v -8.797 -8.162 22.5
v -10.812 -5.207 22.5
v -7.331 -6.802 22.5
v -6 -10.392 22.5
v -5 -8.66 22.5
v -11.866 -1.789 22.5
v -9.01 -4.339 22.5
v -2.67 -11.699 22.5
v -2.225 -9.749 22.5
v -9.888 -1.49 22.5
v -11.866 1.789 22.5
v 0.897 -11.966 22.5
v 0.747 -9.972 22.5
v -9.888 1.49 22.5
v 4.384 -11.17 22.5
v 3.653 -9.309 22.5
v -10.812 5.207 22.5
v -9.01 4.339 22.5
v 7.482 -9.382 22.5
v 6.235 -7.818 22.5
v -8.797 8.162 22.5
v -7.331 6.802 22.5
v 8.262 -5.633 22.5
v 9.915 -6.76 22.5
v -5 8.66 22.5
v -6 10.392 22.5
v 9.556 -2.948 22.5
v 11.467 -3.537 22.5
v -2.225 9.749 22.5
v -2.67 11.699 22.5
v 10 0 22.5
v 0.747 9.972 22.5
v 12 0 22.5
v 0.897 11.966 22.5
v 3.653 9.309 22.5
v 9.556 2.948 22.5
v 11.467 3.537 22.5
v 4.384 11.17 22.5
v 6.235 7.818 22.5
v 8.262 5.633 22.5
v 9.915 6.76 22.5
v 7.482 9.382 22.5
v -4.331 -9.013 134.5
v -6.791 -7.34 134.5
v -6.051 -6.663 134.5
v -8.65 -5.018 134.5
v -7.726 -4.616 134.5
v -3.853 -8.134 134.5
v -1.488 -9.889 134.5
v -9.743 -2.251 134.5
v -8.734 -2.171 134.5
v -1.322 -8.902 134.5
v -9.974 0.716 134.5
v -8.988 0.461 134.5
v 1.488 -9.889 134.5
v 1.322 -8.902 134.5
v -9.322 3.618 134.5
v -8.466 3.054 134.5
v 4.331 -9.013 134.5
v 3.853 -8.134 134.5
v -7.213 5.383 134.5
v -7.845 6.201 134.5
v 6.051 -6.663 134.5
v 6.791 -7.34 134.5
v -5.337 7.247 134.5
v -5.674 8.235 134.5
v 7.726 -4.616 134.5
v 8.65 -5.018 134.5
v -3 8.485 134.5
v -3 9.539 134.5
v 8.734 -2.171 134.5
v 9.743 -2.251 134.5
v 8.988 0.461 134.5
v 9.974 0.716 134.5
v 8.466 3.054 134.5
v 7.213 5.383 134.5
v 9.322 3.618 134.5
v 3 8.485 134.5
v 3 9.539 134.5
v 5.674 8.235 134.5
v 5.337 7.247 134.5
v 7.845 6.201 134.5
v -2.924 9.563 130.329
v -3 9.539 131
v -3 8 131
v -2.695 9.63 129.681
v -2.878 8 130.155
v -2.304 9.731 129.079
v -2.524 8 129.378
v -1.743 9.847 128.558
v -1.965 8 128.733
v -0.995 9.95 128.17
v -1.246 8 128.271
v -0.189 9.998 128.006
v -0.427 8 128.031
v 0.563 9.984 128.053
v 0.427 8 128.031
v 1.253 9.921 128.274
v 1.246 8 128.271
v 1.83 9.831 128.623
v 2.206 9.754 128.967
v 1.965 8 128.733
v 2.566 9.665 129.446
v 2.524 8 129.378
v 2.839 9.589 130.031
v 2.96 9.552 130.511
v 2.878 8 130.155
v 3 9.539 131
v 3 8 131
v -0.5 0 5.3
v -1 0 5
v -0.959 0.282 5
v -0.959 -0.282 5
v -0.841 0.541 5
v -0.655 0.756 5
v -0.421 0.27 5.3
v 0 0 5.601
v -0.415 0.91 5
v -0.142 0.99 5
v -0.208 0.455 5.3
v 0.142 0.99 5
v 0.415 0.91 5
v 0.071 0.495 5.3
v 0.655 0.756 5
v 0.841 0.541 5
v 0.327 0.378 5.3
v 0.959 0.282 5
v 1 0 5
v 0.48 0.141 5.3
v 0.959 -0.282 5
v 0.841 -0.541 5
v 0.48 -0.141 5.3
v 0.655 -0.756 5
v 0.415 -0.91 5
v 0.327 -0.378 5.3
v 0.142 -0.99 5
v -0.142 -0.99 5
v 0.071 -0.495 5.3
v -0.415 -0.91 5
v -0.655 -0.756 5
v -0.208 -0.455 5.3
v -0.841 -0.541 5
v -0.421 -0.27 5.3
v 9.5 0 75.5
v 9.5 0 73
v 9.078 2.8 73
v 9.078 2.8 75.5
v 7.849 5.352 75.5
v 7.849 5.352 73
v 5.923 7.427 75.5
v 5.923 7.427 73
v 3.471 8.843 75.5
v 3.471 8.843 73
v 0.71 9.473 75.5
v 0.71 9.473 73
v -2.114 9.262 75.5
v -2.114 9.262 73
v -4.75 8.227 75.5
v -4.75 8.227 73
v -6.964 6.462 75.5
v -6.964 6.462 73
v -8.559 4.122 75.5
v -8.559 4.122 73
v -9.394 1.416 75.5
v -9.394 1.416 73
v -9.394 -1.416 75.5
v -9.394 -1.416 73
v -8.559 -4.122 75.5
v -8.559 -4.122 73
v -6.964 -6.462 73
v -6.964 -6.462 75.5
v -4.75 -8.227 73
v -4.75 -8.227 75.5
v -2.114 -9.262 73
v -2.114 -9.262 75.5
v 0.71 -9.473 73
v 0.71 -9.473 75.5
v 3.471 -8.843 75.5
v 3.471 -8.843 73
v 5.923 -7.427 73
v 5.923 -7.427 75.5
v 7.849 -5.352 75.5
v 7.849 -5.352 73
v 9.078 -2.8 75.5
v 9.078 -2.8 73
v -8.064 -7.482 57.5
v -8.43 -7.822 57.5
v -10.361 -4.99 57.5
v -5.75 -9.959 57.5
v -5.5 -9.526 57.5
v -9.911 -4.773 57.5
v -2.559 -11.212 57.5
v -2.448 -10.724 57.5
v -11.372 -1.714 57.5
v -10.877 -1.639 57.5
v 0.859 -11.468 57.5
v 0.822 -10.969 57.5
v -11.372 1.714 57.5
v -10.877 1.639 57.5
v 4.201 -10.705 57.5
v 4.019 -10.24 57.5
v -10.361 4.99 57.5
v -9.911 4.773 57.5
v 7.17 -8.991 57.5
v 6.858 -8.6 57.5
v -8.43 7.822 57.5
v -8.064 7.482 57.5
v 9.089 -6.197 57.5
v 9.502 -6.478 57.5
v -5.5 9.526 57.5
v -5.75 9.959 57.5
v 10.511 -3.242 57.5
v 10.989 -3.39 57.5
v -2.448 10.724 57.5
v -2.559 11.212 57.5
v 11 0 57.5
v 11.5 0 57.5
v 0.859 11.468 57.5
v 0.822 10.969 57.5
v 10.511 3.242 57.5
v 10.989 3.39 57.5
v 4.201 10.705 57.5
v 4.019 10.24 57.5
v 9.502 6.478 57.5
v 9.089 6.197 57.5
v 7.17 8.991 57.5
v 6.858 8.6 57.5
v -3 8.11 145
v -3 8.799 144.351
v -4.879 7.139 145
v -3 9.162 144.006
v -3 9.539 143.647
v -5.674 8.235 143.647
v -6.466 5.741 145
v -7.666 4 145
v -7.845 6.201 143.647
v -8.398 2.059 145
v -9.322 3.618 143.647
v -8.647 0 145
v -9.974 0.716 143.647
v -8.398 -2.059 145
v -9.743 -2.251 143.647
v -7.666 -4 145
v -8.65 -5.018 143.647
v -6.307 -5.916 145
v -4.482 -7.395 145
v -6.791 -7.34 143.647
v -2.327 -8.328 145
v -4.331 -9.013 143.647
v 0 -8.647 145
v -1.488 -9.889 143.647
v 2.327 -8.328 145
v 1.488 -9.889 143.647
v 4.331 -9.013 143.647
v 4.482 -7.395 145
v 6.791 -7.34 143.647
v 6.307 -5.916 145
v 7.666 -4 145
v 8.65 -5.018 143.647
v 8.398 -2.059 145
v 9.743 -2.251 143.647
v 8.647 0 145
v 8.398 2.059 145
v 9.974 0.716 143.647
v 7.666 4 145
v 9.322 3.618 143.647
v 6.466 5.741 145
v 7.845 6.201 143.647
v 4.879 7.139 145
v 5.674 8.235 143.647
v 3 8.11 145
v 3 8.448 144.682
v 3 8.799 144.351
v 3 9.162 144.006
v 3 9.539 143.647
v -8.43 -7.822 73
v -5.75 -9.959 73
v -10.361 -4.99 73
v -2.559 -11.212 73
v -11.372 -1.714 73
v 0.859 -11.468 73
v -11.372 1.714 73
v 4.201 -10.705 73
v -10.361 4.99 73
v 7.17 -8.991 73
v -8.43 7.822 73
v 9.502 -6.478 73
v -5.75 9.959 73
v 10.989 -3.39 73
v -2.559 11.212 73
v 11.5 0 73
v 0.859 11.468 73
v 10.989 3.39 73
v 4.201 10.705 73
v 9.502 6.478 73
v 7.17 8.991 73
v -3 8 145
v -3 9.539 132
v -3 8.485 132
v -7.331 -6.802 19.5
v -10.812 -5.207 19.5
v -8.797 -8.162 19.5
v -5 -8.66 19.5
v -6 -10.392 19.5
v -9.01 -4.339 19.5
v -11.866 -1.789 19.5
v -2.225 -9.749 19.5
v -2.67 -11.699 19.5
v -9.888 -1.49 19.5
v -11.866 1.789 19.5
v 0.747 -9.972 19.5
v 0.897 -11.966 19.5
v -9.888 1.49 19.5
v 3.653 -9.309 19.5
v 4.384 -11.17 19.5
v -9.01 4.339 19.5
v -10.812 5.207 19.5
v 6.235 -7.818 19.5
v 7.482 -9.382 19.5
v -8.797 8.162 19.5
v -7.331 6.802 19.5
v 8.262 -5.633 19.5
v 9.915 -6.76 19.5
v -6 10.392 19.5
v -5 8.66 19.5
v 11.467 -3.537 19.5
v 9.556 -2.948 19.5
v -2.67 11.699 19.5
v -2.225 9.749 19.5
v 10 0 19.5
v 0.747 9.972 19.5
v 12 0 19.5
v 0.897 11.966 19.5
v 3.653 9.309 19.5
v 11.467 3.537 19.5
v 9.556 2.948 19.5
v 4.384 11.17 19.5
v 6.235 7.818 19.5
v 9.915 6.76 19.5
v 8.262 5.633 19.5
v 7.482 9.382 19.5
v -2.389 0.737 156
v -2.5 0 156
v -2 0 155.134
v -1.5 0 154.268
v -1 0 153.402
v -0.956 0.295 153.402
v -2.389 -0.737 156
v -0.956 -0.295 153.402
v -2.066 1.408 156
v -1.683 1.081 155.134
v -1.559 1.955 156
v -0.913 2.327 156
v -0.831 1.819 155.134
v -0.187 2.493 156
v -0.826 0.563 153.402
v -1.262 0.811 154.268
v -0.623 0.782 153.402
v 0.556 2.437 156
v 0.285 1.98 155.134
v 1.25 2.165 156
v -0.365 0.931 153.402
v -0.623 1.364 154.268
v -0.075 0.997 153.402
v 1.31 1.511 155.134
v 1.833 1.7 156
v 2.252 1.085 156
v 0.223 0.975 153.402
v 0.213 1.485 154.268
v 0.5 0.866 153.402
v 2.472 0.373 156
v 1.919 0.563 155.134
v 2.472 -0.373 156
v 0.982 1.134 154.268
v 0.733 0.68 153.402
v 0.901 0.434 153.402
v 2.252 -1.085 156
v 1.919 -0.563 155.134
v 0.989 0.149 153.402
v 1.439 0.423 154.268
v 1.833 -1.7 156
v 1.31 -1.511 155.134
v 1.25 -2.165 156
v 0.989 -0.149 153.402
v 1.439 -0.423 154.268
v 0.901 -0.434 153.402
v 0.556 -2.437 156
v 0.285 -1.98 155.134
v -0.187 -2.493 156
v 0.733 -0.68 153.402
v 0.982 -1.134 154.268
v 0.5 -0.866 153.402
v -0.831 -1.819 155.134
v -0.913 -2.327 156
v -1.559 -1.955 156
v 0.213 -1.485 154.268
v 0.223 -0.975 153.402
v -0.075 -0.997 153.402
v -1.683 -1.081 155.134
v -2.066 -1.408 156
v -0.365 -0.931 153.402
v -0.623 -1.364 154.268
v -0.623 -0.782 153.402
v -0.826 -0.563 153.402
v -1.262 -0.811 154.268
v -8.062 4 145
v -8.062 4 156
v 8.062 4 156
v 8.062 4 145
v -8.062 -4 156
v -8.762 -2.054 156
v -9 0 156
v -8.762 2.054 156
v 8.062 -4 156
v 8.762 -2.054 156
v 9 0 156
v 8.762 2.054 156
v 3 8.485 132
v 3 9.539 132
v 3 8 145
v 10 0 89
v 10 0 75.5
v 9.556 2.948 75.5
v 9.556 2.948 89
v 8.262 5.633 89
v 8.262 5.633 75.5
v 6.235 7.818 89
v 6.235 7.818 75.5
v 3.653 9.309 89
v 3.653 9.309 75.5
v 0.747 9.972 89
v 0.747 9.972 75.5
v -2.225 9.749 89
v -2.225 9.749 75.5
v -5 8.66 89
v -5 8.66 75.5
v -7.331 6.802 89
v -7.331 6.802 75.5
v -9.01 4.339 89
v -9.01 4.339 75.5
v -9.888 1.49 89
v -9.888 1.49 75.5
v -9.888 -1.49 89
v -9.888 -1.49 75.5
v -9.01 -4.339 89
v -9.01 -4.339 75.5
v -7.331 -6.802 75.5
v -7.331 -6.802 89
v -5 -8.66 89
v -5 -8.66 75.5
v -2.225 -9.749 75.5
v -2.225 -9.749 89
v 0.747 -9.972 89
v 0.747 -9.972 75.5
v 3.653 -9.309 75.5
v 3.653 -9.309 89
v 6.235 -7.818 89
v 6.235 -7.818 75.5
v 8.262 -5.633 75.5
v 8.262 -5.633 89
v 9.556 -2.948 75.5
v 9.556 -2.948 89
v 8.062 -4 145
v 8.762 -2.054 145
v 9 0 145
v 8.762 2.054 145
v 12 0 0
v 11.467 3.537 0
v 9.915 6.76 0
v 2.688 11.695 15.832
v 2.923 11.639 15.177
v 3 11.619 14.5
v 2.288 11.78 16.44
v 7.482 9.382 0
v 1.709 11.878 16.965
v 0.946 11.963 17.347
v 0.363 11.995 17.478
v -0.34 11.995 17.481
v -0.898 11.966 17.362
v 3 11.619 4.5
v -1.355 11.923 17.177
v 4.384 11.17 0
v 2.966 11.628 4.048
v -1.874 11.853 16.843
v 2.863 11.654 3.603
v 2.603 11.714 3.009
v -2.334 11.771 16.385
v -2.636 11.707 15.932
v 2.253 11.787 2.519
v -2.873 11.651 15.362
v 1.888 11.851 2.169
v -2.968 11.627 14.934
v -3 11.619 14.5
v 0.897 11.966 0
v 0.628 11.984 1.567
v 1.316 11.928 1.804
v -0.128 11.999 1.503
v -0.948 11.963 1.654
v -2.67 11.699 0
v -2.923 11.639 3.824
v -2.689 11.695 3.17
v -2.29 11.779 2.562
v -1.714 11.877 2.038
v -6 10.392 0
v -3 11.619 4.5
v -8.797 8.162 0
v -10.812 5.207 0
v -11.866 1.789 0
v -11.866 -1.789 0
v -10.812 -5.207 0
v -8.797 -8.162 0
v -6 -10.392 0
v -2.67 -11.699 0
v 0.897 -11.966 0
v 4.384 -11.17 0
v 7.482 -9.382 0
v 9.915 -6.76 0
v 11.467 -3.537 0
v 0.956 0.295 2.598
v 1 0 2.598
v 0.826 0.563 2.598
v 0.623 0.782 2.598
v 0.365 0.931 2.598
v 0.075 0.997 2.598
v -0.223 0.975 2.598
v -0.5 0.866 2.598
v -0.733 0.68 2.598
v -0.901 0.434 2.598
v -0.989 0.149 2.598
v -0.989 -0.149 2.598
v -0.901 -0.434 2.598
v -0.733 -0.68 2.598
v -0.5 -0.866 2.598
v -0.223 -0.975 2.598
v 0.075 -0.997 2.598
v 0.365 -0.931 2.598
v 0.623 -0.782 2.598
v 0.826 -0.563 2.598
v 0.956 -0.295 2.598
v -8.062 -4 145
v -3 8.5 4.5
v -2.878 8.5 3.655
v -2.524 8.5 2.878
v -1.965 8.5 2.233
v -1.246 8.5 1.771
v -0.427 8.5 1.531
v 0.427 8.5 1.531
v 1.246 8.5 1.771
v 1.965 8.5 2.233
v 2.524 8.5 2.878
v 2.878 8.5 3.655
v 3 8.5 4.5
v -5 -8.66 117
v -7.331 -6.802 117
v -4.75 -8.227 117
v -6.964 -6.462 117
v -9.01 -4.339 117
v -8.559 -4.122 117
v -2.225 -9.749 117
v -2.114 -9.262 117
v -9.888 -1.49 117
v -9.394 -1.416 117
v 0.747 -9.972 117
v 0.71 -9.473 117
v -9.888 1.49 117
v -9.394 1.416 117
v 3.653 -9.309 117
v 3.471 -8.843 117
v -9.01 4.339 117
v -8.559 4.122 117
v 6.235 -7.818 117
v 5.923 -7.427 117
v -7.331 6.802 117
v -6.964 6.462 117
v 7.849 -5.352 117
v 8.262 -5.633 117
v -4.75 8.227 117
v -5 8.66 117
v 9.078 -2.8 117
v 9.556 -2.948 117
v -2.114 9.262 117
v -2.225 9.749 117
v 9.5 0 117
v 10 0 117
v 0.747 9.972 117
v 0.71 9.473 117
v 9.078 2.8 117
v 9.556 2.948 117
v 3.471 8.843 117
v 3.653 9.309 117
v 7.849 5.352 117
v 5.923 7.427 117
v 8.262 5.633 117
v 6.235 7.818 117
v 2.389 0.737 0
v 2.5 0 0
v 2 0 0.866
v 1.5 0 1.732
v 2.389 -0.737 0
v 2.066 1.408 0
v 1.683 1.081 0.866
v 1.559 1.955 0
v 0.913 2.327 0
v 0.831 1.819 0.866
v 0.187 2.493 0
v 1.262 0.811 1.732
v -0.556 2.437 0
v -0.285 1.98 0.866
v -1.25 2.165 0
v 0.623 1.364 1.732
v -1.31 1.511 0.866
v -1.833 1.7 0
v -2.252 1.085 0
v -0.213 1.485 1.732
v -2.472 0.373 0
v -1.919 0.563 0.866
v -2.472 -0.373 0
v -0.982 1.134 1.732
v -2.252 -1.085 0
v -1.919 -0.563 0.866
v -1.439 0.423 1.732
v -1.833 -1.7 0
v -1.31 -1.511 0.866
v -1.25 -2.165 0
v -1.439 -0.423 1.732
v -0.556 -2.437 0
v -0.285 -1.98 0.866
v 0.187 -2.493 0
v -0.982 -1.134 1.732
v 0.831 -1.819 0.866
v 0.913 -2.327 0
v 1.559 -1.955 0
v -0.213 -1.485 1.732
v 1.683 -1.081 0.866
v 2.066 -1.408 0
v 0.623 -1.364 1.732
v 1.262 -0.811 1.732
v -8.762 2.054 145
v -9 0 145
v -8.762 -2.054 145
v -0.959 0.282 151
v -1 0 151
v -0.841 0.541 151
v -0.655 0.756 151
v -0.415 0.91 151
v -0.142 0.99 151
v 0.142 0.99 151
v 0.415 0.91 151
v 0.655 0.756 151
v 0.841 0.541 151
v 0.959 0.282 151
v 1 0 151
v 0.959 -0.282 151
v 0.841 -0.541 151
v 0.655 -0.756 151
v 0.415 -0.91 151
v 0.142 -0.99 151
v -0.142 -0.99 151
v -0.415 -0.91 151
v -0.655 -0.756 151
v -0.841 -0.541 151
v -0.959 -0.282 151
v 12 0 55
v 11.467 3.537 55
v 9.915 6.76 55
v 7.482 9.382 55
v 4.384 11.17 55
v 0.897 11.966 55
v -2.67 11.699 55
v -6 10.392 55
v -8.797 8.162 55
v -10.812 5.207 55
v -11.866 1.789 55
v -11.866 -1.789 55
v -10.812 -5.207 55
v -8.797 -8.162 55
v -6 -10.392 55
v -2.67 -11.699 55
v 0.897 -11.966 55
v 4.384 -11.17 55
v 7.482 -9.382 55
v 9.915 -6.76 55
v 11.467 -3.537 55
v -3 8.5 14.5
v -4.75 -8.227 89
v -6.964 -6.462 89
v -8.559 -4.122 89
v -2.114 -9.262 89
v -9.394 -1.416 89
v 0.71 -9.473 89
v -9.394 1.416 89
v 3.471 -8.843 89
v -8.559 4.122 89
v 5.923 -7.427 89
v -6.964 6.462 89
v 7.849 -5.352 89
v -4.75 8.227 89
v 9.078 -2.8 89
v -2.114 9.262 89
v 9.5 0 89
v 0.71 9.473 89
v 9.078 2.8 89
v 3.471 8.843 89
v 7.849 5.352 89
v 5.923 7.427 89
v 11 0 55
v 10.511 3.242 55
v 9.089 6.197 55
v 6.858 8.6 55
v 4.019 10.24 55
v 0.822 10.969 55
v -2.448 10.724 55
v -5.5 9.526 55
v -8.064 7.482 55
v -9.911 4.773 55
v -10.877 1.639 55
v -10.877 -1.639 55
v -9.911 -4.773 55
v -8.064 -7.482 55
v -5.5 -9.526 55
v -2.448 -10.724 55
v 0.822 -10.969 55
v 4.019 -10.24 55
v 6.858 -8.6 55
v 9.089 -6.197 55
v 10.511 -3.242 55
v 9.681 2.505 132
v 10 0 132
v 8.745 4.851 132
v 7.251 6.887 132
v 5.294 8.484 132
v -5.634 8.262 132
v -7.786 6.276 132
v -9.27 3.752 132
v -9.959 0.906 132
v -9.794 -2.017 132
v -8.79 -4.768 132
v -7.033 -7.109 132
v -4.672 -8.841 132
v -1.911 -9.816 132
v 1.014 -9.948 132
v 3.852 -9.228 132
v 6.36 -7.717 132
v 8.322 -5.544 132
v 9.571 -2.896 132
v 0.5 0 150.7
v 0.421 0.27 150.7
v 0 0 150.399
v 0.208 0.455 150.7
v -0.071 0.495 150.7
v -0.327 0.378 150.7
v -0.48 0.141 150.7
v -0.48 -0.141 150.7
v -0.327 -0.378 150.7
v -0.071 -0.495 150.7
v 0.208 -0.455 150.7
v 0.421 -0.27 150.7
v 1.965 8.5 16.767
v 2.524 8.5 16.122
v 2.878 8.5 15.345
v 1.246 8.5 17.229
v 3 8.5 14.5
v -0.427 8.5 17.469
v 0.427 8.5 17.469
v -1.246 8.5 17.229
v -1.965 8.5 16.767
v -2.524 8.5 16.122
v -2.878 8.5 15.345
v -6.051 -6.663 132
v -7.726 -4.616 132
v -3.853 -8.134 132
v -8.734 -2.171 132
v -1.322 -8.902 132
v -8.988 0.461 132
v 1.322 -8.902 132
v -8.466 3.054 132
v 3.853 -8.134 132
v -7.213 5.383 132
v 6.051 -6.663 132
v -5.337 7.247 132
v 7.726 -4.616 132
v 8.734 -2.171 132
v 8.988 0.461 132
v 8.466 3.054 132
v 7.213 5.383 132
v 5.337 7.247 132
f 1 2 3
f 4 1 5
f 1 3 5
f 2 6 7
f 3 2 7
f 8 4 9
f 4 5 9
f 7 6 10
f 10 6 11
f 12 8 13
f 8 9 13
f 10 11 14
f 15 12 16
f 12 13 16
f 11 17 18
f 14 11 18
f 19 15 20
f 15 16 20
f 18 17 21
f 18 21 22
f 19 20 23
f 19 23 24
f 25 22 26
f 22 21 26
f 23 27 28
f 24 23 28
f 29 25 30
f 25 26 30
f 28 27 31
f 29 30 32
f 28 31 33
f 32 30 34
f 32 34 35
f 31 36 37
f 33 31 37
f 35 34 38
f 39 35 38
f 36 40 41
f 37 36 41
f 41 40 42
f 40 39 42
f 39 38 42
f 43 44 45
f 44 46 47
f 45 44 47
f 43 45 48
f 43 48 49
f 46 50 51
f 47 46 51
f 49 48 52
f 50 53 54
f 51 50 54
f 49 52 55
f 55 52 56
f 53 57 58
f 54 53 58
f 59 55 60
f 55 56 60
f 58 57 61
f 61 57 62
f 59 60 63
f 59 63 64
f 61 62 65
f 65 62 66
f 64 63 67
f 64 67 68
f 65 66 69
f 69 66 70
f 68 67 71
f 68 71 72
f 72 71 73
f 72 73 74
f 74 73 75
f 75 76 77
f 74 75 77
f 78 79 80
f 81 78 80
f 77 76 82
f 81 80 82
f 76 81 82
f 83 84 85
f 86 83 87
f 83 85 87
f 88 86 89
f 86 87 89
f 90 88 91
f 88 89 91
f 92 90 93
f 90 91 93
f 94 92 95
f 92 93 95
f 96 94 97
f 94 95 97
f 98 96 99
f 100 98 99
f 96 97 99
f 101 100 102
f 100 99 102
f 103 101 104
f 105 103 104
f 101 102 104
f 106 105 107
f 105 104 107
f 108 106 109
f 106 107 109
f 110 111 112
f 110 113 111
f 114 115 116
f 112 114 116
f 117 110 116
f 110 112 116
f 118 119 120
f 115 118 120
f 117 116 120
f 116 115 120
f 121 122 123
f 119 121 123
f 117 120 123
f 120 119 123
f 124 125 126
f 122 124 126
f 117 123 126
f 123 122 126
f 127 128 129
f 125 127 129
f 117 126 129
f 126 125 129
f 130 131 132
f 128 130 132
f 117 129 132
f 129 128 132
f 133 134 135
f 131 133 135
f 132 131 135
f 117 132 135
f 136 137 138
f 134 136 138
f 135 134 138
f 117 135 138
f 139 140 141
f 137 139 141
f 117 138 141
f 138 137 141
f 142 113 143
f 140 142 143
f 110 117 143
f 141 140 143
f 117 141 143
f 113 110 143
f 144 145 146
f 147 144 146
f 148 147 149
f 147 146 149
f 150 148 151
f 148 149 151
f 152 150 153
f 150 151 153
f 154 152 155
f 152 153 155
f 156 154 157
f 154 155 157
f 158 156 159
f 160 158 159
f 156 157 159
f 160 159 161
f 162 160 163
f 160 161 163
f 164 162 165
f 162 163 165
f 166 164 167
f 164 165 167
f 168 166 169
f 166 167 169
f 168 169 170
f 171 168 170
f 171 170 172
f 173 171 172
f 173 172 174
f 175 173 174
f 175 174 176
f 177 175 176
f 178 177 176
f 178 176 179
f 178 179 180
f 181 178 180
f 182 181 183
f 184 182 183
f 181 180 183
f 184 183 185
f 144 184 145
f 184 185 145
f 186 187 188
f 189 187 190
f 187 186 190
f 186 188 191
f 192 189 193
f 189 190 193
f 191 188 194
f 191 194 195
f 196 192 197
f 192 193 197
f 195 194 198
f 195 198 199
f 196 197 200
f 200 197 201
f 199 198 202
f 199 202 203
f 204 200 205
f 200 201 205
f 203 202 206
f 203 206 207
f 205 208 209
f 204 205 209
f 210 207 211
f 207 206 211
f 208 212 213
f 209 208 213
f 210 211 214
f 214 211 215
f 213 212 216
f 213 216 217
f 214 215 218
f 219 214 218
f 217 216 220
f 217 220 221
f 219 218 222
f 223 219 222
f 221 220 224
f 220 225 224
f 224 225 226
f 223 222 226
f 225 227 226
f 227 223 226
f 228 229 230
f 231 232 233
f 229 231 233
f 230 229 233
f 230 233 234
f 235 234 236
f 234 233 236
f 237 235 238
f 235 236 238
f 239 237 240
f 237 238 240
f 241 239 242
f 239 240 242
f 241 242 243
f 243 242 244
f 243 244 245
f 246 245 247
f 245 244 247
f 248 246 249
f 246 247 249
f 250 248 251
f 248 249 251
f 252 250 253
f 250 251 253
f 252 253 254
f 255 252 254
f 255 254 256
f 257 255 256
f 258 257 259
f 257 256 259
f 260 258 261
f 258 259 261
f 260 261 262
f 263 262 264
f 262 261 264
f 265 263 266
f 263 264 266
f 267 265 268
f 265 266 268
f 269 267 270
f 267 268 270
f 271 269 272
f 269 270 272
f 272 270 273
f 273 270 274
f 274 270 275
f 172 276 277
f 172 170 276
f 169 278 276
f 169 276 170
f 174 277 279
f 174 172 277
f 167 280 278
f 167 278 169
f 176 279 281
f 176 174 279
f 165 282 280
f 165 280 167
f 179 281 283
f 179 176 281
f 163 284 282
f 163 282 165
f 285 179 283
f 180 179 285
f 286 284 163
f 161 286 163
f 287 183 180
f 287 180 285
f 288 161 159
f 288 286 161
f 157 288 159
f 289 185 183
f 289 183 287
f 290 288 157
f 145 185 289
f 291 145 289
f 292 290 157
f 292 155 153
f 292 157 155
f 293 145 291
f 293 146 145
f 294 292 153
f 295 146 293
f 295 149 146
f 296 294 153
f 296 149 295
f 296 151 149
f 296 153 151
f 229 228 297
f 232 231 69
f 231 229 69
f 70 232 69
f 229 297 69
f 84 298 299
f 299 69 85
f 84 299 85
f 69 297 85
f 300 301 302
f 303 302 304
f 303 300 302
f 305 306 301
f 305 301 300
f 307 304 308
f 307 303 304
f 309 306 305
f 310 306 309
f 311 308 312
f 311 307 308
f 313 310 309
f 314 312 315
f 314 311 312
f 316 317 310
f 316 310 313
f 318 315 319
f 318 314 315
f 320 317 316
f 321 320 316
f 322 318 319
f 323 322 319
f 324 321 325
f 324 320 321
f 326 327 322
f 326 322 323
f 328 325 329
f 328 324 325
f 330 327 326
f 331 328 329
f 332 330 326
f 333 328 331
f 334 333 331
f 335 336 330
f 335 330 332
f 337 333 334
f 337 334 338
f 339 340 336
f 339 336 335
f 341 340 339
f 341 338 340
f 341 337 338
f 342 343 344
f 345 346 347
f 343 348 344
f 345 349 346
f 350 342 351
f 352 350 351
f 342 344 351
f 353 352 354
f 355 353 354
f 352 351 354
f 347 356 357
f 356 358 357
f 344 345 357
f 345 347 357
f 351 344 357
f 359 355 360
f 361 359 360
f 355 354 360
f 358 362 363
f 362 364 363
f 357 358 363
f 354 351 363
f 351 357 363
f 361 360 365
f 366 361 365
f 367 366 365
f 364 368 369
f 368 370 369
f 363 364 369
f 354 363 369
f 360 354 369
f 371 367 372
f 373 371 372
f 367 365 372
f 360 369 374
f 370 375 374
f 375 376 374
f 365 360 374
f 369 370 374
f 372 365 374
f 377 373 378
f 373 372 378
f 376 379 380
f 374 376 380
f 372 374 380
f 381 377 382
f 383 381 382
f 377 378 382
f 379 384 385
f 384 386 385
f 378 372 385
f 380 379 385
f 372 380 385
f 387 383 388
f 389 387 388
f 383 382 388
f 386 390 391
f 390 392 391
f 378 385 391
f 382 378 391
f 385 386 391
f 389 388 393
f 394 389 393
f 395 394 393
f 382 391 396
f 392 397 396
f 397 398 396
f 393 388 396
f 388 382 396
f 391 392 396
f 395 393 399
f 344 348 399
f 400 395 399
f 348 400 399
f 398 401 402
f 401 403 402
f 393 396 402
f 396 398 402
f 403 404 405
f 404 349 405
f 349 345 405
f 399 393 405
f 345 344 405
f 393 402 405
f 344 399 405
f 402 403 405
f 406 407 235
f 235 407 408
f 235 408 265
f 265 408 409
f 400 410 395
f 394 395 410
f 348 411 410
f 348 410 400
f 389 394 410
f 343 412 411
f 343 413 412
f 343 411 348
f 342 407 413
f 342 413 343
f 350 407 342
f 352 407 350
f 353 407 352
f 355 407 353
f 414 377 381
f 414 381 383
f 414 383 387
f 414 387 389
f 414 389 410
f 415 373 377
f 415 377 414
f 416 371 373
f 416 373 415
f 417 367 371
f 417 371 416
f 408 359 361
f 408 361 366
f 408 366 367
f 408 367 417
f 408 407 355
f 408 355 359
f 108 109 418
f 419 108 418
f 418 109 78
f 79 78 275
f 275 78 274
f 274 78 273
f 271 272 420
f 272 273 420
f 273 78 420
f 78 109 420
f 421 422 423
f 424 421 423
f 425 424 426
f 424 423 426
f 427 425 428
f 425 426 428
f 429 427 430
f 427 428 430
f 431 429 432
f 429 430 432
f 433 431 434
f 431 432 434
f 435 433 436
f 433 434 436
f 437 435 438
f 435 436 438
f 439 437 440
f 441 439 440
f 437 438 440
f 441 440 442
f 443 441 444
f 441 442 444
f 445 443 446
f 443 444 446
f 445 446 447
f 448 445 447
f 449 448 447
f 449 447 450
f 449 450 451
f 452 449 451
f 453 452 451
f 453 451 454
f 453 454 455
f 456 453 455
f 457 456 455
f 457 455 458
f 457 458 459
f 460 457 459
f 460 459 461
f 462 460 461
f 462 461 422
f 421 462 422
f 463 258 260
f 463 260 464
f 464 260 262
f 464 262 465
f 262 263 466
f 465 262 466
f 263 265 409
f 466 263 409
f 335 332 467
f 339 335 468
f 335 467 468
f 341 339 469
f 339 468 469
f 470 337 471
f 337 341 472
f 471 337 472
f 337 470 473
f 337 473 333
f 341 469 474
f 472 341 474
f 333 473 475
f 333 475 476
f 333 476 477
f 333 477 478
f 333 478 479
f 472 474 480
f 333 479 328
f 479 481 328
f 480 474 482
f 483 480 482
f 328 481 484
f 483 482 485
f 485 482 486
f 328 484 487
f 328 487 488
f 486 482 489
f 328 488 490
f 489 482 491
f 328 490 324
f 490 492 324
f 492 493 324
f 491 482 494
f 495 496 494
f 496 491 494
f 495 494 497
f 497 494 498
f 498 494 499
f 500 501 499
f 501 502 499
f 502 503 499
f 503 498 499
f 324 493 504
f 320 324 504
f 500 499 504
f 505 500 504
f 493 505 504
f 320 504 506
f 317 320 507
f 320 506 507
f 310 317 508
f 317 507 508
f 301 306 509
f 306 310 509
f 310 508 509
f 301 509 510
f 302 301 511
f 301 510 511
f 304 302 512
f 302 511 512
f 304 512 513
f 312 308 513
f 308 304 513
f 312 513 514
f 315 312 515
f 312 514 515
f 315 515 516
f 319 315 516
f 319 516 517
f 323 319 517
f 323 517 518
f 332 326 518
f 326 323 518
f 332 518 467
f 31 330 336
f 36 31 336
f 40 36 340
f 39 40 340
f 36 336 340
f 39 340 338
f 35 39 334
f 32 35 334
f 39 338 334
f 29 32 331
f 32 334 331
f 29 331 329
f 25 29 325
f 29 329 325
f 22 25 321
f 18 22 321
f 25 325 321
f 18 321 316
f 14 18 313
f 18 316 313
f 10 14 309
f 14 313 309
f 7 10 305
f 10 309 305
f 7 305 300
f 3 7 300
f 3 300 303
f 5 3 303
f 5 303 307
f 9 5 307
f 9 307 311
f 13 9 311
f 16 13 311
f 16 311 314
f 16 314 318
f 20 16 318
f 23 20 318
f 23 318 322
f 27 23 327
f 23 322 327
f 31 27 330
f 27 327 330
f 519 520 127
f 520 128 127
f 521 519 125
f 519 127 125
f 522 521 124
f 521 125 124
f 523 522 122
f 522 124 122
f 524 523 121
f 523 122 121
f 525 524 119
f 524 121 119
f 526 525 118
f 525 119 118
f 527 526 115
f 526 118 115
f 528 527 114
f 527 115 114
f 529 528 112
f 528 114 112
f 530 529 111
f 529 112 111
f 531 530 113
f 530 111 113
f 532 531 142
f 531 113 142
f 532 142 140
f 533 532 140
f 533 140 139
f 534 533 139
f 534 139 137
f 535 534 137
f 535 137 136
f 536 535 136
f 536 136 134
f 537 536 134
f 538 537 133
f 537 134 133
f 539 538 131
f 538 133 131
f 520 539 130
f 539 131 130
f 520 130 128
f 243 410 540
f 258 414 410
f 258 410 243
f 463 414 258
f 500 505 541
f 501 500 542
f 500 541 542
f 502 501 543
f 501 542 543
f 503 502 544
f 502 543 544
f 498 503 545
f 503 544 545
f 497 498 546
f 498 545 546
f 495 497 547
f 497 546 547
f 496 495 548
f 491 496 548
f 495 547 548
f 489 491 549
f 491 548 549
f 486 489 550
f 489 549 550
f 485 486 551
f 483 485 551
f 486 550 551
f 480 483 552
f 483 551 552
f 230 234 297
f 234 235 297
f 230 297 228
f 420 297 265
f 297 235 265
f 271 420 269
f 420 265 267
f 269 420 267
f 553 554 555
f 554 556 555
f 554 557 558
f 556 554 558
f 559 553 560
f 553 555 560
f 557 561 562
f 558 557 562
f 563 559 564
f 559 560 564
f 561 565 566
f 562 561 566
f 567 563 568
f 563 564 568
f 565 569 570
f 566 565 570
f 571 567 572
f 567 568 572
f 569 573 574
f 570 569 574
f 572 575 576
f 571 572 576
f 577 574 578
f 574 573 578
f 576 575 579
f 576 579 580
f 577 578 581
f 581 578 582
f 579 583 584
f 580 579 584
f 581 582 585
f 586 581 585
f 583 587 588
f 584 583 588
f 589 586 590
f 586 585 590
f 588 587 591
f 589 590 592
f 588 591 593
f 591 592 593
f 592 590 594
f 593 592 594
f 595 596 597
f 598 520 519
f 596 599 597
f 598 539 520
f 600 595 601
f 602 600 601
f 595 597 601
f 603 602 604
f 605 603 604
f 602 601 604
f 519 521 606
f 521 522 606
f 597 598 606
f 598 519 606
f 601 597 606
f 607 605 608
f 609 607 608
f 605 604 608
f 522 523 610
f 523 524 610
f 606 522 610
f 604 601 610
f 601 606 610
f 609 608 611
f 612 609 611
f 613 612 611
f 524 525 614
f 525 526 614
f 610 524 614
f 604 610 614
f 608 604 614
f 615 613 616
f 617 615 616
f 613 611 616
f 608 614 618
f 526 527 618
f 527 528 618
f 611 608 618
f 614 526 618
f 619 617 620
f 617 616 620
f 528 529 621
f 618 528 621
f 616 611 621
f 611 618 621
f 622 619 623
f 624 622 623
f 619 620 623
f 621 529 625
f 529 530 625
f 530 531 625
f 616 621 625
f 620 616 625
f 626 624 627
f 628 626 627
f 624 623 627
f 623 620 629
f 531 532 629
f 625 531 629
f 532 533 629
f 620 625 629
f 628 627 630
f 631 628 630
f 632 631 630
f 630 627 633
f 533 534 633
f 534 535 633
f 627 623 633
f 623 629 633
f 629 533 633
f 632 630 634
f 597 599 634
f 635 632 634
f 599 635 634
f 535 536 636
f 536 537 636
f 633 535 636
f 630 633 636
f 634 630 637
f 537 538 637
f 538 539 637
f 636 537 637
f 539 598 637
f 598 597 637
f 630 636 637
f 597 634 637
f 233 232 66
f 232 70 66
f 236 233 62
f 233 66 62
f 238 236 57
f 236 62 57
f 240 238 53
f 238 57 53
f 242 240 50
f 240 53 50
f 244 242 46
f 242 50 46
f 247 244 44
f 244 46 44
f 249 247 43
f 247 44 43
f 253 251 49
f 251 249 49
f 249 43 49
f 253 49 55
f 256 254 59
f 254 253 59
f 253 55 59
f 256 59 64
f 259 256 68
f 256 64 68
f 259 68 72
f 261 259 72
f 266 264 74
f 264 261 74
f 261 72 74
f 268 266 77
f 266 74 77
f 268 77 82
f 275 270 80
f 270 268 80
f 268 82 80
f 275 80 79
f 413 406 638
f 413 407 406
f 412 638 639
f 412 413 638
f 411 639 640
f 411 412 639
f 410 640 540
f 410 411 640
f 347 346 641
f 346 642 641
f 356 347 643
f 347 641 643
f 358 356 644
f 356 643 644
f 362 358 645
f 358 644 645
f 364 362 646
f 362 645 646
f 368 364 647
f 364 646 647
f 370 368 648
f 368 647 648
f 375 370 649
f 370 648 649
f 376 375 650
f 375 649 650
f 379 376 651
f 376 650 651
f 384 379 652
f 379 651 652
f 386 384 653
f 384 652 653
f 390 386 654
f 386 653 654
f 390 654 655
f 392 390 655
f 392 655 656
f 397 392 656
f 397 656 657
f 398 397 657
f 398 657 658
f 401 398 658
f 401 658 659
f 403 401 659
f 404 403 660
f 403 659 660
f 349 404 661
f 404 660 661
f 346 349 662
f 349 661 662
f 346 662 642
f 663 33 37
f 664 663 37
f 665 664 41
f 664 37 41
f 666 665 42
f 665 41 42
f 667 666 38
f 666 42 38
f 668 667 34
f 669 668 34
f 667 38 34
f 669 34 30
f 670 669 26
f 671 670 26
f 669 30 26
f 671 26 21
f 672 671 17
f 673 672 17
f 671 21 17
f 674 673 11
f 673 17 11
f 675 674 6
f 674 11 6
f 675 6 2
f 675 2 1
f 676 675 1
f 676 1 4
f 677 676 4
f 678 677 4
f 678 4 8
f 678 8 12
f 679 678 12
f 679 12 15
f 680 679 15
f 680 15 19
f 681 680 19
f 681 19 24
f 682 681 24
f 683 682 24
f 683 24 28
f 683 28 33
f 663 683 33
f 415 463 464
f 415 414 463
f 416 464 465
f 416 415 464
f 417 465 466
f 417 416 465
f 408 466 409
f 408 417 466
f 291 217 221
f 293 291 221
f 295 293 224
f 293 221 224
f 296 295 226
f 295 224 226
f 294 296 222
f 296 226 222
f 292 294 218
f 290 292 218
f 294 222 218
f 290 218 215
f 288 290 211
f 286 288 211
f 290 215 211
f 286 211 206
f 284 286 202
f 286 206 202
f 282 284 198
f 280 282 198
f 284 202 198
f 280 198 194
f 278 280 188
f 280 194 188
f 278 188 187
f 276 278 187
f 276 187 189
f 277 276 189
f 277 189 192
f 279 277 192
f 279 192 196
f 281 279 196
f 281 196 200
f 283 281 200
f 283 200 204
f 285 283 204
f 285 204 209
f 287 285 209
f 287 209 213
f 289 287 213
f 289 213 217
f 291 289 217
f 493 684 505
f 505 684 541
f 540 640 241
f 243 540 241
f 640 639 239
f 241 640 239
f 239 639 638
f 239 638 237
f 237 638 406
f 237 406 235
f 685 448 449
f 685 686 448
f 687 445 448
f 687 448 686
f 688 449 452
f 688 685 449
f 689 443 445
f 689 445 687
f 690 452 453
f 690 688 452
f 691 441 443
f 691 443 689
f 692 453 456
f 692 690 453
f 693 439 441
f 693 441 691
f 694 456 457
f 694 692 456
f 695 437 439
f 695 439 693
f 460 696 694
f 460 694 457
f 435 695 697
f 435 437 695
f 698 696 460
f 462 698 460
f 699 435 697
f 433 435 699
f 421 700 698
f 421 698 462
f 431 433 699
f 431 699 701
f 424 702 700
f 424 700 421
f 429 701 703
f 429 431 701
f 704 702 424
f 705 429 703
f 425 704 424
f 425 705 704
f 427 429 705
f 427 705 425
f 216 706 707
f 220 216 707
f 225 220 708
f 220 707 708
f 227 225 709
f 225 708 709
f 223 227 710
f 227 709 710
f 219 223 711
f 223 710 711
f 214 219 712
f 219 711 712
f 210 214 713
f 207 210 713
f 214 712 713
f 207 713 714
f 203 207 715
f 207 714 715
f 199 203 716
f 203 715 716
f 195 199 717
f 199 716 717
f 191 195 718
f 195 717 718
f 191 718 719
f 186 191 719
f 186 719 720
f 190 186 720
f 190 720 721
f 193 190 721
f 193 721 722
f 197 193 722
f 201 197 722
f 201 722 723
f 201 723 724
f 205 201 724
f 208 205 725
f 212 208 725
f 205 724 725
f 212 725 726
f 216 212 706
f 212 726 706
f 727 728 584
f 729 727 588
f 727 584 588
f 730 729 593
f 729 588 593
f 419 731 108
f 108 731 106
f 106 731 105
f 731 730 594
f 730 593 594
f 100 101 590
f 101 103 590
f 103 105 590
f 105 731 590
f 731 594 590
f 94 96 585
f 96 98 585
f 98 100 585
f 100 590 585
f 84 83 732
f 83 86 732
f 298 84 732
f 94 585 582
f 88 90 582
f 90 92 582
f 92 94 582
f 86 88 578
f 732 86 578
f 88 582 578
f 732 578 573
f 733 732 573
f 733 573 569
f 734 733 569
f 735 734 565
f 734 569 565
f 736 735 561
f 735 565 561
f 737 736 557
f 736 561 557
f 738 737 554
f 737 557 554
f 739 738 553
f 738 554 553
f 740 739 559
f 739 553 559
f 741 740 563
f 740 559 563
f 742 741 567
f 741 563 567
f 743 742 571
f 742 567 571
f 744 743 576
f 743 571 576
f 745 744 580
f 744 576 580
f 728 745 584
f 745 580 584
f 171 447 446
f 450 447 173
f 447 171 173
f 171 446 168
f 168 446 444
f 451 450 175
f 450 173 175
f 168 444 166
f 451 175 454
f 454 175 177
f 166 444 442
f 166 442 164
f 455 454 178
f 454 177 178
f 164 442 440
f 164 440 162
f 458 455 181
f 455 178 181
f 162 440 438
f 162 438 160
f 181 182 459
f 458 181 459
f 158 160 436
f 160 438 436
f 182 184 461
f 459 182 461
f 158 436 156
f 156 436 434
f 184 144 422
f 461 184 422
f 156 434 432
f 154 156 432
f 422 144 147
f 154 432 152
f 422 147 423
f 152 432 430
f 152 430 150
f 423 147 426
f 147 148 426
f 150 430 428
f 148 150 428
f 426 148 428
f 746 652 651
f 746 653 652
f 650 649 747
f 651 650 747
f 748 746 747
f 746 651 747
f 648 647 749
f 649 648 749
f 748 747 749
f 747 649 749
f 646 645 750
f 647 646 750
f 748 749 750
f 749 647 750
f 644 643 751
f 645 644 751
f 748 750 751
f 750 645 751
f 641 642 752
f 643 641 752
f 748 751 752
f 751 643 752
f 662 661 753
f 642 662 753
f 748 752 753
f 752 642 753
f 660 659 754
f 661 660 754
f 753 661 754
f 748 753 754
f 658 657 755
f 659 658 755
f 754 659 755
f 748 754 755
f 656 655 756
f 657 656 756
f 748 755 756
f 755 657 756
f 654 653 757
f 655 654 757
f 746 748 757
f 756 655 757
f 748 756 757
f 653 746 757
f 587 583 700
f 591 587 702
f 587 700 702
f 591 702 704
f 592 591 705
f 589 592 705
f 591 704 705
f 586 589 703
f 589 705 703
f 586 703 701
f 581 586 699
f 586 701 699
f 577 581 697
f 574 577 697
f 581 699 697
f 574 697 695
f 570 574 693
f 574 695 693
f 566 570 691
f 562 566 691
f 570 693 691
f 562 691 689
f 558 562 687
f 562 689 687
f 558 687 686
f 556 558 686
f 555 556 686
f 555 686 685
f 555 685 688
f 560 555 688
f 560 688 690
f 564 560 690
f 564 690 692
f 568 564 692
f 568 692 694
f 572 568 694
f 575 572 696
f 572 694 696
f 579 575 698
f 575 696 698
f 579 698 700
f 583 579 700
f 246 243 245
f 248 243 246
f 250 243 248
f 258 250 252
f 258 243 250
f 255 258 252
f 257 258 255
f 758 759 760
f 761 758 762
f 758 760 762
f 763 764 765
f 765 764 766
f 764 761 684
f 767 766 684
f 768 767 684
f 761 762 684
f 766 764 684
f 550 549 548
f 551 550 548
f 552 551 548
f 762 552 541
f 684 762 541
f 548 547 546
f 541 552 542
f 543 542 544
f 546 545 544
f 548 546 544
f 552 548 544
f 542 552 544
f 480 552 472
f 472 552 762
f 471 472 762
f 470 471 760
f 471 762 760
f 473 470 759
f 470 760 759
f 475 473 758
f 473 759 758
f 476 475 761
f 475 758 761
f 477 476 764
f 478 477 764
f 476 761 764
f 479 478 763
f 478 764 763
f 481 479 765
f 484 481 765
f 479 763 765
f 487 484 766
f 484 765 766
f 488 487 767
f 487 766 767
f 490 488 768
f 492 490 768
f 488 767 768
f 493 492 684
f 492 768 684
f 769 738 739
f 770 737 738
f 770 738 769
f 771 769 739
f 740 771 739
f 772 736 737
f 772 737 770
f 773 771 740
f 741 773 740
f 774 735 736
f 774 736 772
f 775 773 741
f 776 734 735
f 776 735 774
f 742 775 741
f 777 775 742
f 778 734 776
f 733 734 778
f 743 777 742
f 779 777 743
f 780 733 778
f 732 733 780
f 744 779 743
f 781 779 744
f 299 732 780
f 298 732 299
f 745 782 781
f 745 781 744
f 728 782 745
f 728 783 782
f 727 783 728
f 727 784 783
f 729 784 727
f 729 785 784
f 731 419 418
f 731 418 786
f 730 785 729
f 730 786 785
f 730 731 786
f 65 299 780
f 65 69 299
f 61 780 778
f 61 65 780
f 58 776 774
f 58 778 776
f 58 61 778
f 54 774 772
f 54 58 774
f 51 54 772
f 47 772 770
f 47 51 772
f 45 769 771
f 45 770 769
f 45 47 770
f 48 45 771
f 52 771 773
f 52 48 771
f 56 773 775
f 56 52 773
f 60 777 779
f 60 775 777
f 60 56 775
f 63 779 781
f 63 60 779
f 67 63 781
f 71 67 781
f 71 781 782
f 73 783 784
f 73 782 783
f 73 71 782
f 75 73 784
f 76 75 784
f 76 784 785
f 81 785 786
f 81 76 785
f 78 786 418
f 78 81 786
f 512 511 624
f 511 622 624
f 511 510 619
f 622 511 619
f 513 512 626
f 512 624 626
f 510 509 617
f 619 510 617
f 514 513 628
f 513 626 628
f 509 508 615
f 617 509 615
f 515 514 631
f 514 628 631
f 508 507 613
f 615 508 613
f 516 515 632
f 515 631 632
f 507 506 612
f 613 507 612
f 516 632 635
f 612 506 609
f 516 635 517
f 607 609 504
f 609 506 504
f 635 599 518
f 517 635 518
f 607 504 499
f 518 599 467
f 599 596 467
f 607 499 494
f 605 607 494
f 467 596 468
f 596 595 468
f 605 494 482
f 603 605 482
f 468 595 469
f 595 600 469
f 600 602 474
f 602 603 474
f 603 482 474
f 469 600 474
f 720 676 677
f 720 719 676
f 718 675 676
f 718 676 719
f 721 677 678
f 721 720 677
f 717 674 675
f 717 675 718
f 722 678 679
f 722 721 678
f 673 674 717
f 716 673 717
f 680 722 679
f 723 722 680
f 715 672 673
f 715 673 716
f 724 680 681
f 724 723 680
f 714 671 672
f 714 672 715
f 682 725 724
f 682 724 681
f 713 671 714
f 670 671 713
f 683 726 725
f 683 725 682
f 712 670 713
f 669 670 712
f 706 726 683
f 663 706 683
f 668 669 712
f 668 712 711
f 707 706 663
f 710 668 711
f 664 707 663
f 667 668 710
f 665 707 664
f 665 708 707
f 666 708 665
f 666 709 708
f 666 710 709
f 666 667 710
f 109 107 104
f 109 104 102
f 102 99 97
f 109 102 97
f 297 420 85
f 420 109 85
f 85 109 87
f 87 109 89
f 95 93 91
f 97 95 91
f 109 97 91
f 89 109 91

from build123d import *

# Parameters (mm, degrees)
SKETCH_1_R            = 12
EXTRUDE_1_DEPTH       = 55
CUT_EXTRUDE_START     = 19.5
SKETCH_2_OUTSIDE_W    = 38.926
SKETCH_2_OUTSIDE_H    = 38.926
SKETCH_2_OUTSIDE_R    = 10
CUT_EXTRUDE_1_DEPTH   = 3
SKETCH_3_R            = 11.5
EXTRUDE_2_DEPTH       = 18
SKETCH_4_OUTSIDE_W    = 42.1
SKETCH_4_OUTSIDE_H    = 42.1
SKETCH_4_OUTSIDE_R    = 11
CUT_EXTRUDE_2_DEPTH   = 2.5
SKETCH_5_R            = 10
EXTRUDE_3_DEPTH       = 16
SKETCH_6_OUTSIDE_W    = 45.05
SKETCH_6_OUTSIDE_H    = 45.05
SKETCH_6_OUTSIDE_R    = 9.5
CUT_EXTRUDE_3_DEPTH   = 2.5
SKETCH_7_R            = 9.5
EXTRUDE_4_DEPTH       = 28
SKETCH_9_R            = 10
EXTRUDE_6_DEPTH       = 15
SKETCH_10_R           = 10
EXTRUDE_7_DEPTH       = 24
SKETCH_11_OUTSIDE_W   = 57.93
SKETCH_11_OUTSIDE_H   = 57.93
SKETCH_11_OUTSIDE_R   = 9
CUT_EXTRUDE_4_DEPTH   = 11
CUT_EXTRUDE_START_2   = -21.5
SKETCH_12_OUTSIDE_W   = 57.93
SKETCH_12_OUTSIDE_H   = 57.93
SKETCH_12_OUTSIDE_R   = 9
CUT_EXTRUDE_5_DEPTH   = 2.5
CUT_EXTRUDE_8_DEPTH   = 157.920361967
CUT_EXTRUDE_START_3   = 8
CUT_EXTRUDE_9_DEPTH   = 149.920361967
CUT_EXTRUDE_START_4   = 8.5
CUT_EXTRUDE_10_DEPTH  = 149.420361967
F_2_0MM_1_D           = 2
F_2_0MM_1_DEPTH       = 5
F_2_0MM_1_CSINK_D     = 5
F_2_0MM_1_CSINK_ANGLE = 60
F_2_0MM_1_TIP         = 0.600860619
F_2_0MM_4_D           = 2
F_2_0MM_4_DEPTH       = 5
F_2_0MM_4_CSINK_D     = 5
F_2_0MM_4_CSINK_ANGLE = 60
F_2_0MM_4_TIP         = 0.600860619


# Read off the part's stored shape, not the designer's step: M20 机械螺纹 螺柱1
with BuildPart() as part:
    # 草图1 → 凸台-拉伸1 (new body)
    with BuildSketch(Plane.XY):
        Circle(SKETCH_1_R)
    extrude(amount=EXTRUDE_1_DEPTH)

    # 草图2 outside → 切除-拉伸1 (cut)
    with BuildSketch(Plane.XY.offset(CUT_EXTRUDE_START)):
        Rectangle(SKETCH_2_OUTSIDE_W, SKETCH_2_OUTSIDE_H)
        Circle(SKETCH_2_OUTSIDE_R, mode=Mode.SUBTRACT)
    extrude(amount=CUT_EXTRUDE_1_DEPTH, mode=Mode.SUBTRACT)

    # 草图3 → 凸台-拉伸2 (add)
    with BuildSketch(Plane.XY.offset(55)):
        Circle(SKETCH_3_R)
    extrude(amount=EXTRUDE_2_DEPTH)

    # 草图4 outside → 切除-拉伸2 (cut)
    with BuildSketch(Plane.XY.offset(55)):
        Rectangle(SKETCH_4_OUTSIDE_W, SKETCH_4_OUTSIDE_H)
        Circle(SKETCH_4_OUTSIDE_R, mode=Mode.SUBTRACT)
    extrude(amount=CUT_EXTRUDE_2_DEPTH, mode=Mode.SUBTRACT)

    # 草图5 → 凸台-拉伸3 (add)
    with BuildSketch(Plane.XY.offset(73)):
        Circle(SKETCH_5_R)
    extrude(amount=EXTRUDE_3_DEPTH)

    # 草图6 outside → 切除-拉伸3 (cut)
    with BuildSketch(Plane.XY.offset(73)):
        Rectangle(SKETCH_6_OUTSIDE_W, SKETCH_6_OUTSIDE_H)
        Circle(SKETCH_6_OUTSIDE_R, mode=Mode.SUBTRACT)
    extrude(amount=CUT_EXTRUDE_3_DEPTH, mode=Mode.SUBTRACT)

    # 草图7 → 凸台-拉伸4 (add)
    with BuildSketch(Plane.XY.offset(89)):
        Circle(SKETCH_7_R)
    extrude(amount=EXTRUDE_4_DEPTH)

    # 草图9 → 凸台-拉伸6 (add)
    with BuildSketch(Plane.XY.offset(117)):
        Circle(SKETCH_9_R)
    extrude(amount=EXTRUDE_6_DEPTH)

    # 草图10 → 凸台-拉伸7 (add)
    with BuildSketch(Plane.XY.offset(132)):
        Circle(SKETCH_10_R)
    extrude(amount=EXTRUDE_7_DEPTH)

    # 草图11 outside → 切除-拉伸4 (cut)
    with BuildSketch(Plane.XY.offset(156)):
        Rectangle(SKETCH_11_OUTSIDE_W, SKETCH_11_OUTSIDE_H)
        Circle(SKETCH_11_OUTSIDE_R, mode=Mode.SUBTRACT)
    extrude(amount=-CUT_EXTRUDE_4_DEPTH, mode=Mode.SUBTRACT)

    # 草图12 outside → 切除-拉伸5 (cut)
    with BuildSketch(Plane.XY.offset(156).offset(CUT_EXTRUDE_START_2)):
        Rectangle(SKETCH_12_OUTSIDE_W, SKETCH_12_OUTSIDE_H)
        Circle(SKETCH_12_OUTSIDE_R, mode=Mode.SUBTRACT)
    extrude(amount=-CUT_EXTRUDE_5_DEPTH, mode=Mode.SUBTRACT)

    # M20 机械螺纹 螺柱1 outline → M20 机械螺纹 螺柱1 (revolve, cut)
    with BuildSketch(Plane.XZ):
        Polygon((10, 145), (8.647, 145), (10, 143.647), align=None)
    revolve(axis=Axis((0, 0, 0), (0, 0, 1)), mode=Mode.SUBTRACT)

    # 草图14 → 切除-拉伸8 (cut, symmetric)
    with BuildSketch(Plane(origin=(0, 0, 0), x_dir=(0, 0, -1), z_dir=(1, 0, 0))):
        Polygon((-479.636732543, 4), (-156, 4), (-145, 4), (-145, 14.592114555), (-145, 338.228847098), (-602.412263469, 796.199326311), (-937.048996012, 461.970479214), align=None)
    cut_extrude_8 = extrude(amount=CUT_EXTRUDE_8_DEPTH, both=True, mode=Mode.SUBTRACT)

    # 镜向1: 切除-拉伸8 across plane
    add(cut_extrude_8.mirror(Plane.ZX), mode=Mode.SUBTRACT)

    # 草图15 → 切除-拉伸9 (cut, through all)
    with BuildSketch(Plane(origin=(0, 0, 0), x_dir=(1, 0, 0), z_dir=(0, 1, 0)).offset(CUT_EXTRUDE_START_3)):
        with BuildLine():
            Line((-3, -145), (-3, -131))
            ThreePointArc((-3, -131), (0, -128), (3, -131))
            Line((3, -131), (3, -145))
            ThreePointArc((3, -145), (0, -148), (-3, -145))
        make_face()
    extrude(amount=CUT_EXTRUDE_9_DEPTH, mode=Mode.SUBTRACT)

    # 草图17 → 切除-拉伸10 (cut, through all)
    with BuildSketch(Plane(origin=(0, 0, 0), x_dir=(1, 0, 0), z_dir=(0, 1, 0)).offset(CUT_EXTRUDE_START_4)):
        with BuildLine():
            Line((3, -4.5), (3, -14.5))
            ThreePointArc((3, -14.5), (0, -17.5), (-3, -14.5))
            Line((-3, -14.5), (-3, -4.5))
            ThreePointArc((-3, -4.5), (0, -1.5), (3, -4.5))
        make_face()
    extrude(amount=CUT_EXTRUDE_10_DEPTH, mode=Mode.SUBTRACT)

    # Ø2.0mm 暗销孔1
    with Locations(Plane(origin=(0, 0, 0), x_dir=(-1, 0, 0), z_dir=(0, 0, -1))):
        with Locations((0, 0)):
            CounterSinkHole(F_2_0MM_1_D / 2, F_2_0MM_1_CSINK_D / 2, depth=F_2_0MM_1_DEPTH, counter_sink_angle=F_2_0MM_1_CSINK_ANGLE)
            with Locations((0, 0, -(F_2_0MM_1_DEPTH + F_2_0MM_1_TIP / 2))):  # 118° drill point
                Cone(0, F_2_0MM_1_D / 2, F_2_0MM_1_TIP, mode=Mode.SUBTRACT)

    # Ø2.0mm 暗销孔4
    with Locations(Plane.XY.offset(156)):
        with Locations((0, 0)):
            CounterSinkHole(F_2_0MM_4_D / 2, F_2_0MM_4_CSINK_D / 2, depth=F_2_0MM_4_DEPTH, counter_sink_angle=F_2_0MM_4_CSINK_ANGLE)
            with Locations((0, 0, -(F_2_0MM_4_DEPTH + F_2_0MM_4_TIP / 2))):  # 118° drill point
                Cone(0, F_2_0MM_4_D / 2, F_2_0MM_4_TIP, mode=Mode.SUBTRACT)


solid = part.part
